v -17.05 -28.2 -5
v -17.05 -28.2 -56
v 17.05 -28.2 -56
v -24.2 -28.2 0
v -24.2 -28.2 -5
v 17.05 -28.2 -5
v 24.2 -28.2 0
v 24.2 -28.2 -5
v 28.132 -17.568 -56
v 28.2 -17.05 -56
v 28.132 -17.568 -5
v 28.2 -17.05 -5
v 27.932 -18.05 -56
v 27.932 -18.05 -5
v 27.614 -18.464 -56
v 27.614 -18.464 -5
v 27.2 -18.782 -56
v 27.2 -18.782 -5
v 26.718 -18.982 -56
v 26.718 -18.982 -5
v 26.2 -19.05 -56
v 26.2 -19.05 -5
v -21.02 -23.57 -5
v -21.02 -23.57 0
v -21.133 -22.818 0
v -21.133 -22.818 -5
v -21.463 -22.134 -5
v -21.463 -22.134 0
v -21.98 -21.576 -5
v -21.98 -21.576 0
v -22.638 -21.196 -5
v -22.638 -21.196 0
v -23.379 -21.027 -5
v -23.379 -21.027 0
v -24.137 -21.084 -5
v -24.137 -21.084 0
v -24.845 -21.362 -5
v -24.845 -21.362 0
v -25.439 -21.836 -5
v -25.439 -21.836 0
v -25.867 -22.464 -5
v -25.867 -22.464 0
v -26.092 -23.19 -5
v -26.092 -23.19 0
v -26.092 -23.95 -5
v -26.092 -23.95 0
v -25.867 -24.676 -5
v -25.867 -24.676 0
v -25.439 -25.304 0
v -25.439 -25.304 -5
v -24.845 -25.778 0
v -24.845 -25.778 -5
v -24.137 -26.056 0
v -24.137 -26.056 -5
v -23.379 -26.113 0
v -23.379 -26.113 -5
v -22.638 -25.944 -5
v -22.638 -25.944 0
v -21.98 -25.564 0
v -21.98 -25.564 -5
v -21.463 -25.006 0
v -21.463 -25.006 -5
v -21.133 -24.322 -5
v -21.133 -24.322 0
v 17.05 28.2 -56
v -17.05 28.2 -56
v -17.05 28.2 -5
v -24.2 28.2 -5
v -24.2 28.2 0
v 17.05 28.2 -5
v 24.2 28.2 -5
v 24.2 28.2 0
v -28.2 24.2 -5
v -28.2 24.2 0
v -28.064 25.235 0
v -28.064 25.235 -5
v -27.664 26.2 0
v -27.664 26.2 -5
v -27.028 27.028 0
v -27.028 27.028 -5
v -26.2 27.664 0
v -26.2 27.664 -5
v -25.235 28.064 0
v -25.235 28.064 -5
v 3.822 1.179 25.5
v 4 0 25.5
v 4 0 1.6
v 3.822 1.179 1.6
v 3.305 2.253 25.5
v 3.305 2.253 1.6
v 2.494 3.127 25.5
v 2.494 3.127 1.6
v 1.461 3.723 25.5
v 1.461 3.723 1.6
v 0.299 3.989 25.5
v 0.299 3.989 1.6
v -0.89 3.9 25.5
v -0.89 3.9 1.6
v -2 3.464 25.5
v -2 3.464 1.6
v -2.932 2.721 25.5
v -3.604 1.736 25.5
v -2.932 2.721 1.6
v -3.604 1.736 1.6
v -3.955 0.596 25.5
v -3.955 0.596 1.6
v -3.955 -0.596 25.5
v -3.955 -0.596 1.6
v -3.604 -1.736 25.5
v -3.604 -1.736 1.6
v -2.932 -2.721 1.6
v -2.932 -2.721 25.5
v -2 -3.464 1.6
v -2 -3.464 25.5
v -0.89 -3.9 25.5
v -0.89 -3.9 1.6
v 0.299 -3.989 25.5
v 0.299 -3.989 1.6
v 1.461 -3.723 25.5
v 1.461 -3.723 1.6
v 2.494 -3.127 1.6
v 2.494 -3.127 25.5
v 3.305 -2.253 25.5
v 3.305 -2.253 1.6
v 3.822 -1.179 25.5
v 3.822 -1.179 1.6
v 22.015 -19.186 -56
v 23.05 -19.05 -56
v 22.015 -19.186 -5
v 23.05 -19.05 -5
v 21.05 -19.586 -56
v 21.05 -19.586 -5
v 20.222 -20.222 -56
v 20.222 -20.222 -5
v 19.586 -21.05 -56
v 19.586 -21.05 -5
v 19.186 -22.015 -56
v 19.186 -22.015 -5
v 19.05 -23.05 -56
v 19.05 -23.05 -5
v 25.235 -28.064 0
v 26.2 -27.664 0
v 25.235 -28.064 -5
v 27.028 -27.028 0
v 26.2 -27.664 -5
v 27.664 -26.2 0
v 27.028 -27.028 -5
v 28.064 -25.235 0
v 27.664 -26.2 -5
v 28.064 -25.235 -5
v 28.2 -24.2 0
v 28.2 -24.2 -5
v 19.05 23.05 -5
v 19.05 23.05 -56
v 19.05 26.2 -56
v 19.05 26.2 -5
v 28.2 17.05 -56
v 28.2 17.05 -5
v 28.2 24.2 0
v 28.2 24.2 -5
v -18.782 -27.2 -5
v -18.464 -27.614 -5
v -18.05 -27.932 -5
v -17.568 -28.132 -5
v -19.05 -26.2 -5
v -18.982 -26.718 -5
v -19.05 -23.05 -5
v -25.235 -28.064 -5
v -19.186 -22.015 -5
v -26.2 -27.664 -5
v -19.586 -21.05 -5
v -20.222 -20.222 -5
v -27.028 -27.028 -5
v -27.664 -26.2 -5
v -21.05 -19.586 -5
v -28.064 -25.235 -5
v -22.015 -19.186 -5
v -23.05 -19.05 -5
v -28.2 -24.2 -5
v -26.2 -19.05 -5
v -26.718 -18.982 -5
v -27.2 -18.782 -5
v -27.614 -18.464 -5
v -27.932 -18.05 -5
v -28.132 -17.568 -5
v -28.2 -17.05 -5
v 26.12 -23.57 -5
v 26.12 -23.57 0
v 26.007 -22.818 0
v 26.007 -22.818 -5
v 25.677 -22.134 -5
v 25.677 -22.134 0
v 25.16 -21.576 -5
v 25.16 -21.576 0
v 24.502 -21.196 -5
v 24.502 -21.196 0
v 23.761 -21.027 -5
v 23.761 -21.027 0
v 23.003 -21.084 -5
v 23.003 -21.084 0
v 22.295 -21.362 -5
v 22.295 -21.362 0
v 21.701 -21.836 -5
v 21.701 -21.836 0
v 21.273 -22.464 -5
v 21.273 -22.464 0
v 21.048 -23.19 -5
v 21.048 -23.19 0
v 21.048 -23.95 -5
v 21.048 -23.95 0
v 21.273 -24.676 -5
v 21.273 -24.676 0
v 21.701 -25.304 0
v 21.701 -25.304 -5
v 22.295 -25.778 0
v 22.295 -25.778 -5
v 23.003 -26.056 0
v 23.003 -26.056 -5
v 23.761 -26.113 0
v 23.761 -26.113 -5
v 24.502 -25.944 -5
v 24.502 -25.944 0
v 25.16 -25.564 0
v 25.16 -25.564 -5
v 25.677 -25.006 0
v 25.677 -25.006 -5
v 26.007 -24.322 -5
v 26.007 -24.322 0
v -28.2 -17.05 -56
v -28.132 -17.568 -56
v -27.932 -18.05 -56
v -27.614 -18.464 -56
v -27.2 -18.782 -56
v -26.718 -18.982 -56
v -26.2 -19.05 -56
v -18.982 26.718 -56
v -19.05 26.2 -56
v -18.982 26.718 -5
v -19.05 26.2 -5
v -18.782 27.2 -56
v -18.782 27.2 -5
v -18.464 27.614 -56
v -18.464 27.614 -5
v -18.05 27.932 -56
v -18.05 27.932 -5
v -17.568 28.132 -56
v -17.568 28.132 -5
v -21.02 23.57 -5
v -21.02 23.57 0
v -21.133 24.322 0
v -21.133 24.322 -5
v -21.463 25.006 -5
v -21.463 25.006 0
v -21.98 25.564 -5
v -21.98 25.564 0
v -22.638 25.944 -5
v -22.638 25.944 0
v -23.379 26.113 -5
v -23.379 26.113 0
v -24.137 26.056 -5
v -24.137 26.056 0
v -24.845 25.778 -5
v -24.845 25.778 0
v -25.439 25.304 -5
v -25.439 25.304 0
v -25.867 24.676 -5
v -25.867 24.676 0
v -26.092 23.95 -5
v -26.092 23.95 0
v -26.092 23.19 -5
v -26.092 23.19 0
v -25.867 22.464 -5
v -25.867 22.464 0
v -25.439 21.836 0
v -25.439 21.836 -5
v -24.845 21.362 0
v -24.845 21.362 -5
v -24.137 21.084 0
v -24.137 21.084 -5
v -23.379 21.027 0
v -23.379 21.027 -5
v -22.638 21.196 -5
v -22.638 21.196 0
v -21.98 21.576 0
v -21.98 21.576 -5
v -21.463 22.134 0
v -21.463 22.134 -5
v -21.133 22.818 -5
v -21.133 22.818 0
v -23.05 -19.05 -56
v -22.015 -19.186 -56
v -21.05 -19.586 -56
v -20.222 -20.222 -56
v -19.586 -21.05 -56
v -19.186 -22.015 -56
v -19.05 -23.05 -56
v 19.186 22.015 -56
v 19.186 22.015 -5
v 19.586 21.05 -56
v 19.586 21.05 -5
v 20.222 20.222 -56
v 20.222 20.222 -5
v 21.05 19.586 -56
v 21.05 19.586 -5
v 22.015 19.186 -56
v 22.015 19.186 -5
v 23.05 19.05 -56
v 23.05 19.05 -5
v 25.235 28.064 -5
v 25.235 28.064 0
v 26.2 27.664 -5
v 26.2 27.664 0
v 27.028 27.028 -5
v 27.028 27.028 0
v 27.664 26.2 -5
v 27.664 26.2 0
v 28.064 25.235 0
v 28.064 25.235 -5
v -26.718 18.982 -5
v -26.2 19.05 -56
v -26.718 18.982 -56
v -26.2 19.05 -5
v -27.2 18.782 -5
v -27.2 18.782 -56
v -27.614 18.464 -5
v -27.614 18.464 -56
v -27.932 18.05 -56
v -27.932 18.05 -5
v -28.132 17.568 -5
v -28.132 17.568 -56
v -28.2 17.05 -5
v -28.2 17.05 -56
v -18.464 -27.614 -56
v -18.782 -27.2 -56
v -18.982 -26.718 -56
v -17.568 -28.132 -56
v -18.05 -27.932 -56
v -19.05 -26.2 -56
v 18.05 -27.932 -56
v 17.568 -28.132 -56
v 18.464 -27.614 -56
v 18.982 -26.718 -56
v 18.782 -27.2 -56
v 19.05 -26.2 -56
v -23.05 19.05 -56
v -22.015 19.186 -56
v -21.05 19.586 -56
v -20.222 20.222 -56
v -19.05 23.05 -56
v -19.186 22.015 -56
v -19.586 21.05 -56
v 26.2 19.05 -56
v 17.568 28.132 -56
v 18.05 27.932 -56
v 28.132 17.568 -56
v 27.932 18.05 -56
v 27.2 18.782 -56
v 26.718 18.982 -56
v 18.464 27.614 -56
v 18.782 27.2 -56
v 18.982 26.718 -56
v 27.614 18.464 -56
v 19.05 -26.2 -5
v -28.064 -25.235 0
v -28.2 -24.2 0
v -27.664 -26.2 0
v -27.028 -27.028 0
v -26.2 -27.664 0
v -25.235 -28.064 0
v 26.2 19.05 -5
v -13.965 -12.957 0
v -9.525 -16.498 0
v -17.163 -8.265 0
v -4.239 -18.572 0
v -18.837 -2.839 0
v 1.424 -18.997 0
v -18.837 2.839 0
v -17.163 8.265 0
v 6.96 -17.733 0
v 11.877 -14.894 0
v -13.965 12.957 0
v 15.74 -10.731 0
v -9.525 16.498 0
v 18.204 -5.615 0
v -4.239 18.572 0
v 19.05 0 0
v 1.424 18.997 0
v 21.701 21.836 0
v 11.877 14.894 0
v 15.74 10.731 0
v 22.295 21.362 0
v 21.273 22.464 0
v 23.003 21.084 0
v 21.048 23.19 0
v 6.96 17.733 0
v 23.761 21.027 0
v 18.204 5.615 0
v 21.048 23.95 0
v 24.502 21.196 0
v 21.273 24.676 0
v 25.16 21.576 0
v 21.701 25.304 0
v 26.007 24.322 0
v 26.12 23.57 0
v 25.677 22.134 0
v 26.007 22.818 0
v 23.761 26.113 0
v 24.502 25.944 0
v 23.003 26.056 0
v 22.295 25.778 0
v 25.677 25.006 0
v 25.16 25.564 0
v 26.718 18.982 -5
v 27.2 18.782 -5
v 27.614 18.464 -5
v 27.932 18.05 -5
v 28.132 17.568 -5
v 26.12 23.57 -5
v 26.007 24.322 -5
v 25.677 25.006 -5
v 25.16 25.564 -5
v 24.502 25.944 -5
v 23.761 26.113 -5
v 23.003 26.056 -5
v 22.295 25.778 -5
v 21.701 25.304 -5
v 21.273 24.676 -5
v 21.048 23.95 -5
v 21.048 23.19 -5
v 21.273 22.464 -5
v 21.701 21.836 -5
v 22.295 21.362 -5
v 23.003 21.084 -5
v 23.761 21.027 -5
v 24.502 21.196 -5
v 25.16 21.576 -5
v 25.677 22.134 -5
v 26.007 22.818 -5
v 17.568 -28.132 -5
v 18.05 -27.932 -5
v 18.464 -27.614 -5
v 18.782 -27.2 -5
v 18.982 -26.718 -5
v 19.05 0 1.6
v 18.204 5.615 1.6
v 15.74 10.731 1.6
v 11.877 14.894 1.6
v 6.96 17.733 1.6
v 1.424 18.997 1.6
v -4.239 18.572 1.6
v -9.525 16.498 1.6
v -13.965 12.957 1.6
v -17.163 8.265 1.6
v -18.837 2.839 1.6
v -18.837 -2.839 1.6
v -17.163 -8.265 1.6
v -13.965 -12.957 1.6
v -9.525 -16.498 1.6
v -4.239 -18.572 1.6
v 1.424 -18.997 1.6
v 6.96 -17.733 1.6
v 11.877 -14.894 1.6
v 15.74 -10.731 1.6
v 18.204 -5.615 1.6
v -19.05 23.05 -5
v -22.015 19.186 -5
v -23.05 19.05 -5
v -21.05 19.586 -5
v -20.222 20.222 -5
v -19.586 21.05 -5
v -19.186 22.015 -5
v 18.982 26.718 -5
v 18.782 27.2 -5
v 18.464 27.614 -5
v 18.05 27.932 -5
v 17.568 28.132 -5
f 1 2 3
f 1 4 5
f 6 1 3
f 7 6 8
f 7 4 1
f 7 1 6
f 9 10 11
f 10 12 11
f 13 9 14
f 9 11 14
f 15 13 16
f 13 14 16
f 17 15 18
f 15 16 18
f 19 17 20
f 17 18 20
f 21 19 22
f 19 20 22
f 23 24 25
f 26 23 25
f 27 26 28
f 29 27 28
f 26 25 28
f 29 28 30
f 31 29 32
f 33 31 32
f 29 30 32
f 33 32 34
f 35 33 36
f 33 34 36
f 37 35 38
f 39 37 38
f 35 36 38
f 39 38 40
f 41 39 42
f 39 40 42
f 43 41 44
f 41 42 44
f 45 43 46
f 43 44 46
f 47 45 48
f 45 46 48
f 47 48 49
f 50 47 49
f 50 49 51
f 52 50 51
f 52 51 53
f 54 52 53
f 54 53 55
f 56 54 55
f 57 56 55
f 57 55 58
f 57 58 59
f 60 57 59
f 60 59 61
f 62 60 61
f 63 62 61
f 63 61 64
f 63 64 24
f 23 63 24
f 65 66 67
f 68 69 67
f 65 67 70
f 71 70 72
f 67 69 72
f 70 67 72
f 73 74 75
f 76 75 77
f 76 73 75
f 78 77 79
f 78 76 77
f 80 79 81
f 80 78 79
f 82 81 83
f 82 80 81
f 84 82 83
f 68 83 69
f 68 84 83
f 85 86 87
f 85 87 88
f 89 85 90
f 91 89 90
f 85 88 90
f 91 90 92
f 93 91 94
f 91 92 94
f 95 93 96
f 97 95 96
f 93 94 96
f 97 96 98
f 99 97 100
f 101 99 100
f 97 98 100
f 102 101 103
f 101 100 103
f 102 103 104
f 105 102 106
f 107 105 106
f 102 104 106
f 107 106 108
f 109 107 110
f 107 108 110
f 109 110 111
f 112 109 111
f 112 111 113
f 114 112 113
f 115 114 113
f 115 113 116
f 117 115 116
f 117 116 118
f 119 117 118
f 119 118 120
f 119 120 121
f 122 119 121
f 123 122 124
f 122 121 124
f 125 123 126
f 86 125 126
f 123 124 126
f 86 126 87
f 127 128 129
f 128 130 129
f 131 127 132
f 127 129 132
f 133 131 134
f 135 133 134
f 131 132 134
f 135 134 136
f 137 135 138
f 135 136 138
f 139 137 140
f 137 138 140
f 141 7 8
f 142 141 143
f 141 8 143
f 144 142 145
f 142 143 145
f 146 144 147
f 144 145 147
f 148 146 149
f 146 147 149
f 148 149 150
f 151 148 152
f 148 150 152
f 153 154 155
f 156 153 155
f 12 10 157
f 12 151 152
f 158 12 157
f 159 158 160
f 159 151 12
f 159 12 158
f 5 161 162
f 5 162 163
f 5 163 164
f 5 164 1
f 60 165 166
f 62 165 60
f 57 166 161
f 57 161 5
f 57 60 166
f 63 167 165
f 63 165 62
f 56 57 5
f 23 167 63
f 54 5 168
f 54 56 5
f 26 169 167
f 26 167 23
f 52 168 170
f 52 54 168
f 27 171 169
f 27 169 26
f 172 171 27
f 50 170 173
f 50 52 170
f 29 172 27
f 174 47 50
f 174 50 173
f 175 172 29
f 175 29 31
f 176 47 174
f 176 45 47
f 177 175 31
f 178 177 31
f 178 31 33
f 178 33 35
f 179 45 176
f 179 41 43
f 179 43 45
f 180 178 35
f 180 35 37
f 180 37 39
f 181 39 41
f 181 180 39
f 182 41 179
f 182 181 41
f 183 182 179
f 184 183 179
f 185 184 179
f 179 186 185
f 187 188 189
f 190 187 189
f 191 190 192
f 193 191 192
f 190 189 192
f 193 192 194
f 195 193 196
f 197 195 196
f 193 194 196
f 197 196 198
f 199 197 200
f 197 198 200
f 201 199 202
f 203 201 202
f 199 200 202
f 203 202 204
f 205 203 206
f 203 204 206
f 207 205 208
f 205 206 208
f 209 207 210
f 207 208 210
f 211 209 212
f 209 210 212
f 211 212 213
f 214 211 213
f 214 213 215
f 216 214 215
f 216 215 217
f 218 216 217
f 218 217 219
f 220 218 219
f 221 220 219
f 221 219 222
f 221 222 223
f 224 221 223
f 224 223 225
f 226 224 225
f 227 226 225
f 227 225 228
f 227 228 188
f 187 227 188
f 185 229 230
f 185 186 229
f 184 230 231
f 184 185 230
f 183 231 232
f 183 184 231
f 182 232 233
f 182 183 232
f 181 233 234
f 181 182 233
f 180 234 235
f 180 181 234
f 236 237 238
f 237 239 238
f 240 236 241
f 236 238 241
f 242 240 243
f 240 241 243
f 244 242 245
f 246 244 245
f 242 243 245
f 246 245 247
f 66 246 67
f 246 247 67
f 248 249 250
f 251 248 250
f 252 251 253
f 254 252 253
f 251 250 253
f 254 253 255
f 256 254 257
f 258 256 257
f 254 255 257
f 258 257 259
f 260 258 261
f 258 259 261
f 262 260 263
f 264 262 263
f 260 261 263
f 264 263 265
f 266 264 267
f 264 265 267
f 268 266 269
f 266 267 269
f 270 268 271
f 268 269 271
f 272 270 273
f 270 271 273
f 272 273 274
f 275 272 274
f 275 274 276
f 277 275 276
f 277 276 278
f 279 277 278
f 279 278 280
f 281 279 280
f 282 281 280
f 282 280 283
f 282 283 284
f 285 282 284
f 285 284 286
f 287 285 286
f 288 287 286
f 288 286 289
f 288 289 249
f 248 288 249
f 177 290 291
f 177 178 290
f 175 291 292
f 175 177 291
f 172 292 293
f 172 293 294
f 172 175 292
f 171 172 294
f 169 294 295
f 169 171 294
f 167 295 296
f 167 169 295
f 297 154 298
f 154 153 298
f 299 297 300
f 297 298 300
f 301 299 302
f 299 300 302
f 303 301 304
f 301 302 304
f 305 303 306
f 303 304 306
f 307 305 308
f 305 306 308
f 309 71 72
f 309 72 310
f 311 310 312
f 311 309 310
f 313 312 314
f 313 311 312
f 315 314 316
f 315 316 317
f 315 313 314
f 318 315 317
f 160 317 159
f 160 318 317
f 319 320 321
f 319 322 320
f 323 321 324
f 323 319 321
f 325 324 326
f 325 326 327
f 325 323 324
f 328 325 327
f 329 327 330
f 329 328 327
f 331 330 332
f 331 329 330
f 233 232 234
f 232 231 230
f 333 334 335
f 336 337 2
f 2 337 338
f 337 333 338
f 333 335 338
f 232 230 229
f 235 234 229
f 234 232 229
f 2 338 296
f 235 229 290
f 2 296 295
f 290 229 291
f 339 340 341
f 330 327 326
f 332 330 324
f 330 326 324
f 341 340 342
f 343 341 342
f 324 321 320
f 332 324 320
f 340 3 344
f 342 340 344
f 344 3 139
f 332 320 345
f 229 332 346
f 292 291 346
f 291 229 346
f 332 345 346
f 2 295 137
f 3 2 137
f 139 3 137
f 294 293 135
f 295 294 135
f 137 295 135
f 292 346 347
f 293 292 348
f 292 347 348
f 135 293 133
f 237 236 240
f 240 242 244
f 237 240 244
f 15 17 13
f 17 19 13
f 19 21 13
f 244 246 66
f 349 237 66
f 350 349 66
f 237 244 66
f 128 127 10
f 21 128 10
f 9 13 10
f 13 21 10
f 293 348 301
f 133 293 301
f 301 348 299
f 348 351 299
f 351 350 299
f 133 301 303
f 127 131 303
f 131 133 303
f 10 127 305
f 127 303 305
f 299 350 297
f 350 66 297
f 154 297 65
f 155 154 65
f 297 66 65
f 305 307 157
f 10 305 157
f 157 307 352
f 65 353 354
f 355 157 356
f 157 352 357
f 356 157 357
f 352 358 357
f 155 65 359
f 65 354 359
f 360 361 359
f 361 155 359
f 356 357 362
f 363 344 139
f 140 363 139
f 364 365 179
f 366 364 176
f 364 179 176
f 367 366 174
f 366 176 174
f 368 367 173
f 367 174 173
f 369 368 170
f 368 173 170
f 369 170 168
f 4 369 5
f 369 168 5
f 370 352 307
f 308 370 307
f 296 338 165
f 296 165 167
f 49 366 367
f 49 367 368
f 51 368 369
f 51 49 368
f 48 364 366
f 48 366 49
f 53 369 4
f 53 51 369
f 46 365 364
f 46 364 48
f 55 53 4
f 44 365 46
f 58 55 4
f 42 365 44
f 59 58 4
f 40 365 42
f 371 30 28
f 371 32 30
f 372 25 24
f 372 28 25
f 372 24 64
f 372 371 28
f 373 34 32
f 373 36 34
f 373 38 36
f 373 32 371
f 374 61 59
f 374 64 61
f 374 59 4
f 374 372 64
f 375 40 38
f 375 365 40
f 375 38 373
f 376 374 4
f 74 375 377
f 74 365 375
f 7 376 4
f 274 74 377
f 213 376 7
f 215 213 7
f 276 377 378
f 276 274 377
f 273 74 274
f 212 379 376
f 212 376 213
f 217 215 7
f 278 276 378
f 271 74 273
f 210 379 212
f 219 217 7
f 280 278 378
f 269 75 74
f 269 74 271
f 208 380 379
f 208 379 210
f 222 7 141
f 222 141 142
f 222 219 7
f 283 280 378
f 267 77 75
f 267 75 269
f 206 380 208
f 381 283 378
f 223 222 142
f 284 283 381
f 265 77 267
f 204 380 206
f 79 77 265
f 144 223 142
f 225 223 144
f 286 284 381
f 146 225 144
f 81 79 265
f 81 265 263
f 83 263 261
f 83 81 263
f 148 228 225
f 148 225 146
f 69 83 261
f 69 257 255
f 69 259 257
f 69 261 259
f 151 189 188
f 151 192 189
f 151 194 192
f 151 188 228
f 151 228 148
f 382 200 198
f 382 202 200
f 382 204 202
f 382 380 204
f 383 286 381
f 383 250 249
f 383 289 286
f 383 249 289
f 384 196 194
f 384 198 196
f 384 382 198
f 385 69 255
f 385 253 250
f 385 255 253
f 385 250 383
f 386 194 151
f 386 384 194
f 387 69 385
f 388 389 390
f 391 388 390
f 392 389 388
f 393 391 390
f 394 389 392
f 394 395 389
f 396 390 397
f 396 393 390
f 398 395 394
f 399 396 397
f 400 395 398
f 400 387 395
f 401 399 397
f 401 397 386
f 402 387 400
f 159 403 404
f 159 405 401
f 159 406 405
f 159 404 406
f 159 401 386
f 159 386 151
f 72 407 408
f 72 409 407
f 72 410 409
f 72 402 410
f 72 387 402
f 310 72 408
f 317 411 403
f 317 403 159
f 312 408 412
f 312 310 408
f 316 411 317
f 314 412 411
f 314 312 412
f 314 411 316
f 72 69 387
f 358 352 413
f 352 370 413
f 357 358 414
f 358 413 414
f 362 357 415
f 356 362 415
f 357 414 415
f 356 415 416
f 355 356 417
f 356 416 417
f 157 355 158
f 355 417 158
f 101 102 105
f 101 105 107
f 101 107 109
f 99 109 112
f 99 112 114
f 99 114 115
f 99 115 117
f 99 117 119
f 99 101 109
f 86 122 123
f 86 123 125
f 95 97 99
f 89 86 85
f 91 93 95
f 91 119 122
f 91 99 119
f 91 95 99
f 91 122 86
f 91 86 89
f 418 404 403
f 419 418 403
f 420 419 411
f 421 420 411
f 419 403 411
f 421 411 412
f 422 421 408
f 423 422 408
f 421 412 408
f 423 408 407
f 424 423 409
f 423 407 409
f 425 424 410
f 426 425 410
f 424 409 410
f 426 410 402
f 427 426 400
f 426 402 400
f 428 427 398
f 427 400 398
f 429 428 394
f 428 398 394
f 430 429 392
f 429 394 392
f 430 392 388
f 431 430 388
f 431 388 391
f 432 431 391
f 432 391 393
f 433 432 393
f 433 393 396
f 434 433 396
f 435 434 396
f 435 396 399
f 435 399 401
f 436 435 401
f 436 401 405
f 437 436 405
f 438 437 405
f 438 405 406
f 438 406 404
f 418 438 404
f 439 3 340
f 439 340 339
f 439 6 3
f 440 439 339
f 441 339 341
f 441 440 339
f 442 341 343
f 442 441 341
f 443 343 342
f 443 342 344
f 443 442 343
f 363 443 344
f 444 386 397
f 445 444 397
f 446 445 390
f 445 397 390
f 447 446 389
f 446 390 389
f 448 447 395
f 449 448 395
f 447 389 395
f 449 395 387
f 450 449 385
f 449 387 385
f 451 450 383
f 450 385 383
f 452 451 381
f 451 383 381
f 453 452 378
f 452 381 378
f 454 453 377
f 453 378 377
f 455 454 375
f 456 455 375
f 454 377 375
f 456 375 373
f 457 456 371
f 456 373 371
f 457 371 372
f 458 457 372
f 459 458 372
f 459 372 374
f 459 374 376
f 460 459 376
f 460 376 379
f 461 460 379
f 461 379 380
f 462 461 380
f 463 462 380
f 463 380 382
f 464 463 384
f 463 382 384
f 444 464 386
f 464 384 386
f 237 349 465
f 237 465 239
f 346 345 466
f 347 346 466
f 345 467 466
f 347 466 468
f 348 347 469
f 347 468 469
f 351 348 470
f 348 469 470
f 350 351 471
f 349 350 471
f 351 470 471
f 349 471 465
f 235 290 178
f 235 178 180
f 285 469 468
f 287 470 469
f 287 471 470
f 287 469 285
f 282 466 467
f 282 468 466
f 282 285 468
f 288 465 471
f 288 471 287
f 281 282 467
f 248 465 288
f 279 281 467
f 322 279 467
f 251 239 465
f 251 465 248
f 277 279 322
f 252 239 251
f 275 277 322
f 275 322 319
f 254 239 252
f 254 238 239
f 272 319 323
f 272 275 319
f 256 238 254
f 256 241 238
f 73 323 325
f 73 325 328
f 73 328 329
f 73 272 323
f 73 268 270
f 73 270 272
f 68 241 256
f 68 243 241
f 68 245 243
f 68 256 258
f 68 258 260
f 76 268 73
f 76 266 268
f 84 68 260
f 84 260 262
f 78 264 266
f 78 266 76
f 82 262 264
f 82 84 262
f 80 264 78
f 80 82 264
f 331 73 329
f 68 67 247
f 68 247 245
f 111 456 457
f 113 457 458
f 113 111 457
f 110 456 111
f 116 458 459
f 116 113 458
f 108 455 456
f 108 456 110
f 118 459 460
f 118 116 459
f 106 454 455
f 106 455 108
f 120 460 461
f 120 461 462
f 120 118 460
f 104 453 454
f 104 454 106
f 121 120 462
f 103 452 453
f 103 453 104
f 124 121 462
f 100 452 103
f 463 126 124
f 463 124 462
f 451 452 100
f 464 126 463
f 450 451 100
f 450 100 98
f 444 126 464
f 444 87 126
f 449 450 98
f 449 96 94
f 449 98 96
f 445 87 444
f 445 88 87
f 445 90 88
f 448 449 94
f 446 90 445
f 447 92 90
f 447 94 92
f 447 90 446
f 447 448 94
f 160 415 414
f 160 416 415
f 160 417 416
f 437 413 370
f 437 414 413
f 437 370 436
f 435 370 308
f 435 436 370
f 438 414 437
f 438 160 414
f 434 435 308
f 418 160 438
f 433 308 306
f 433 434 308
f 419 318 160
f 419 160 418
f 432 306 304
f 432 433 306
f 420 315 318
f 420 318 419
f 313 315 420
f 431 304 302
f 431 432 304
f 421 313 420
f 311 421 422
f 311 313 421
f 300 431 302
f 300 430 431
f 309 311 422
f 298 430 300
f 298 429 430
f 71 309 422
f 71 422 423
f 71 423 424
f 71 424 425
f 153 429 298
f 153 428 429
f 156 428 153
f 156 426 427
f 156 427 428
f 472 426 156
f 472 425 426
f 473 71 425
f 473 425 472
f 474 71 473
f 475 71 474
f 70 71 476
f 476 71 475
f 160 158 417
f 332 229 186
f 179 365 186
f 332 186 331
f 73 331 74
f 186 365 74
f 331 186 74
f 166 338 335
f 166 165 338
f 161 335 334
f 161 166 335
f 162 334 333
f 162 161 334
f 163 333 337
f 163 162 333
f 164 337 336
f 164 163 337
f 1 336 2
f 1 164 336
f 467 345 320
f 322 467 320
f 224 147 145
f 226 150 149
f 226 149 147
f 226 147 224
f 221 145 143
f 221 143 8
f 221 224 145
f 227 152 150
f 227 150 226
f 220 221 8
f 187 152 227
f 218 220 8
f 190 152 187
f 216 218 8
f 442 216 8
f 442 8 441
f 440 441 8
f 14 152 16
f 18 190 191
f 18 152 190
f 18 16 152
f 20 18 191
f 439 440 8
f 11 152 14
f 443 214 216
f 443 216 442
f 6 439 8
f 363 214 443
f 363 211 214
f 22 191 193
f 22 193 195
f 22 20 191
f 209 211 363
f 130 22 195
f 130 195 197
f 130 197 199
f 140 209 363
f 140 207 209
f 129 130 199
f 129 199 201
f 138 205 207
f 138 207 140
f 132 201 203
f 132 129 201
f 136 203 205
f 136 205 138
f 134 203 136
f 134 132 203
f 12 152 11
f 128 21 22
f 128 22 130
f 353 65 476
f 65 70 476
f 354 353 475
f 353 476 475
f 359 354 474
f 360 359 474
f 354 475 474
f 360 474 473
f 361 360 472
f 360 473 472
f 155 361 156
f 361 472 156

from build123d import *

# Parameters (mm, degrees)
SKETCH1_W           = 56.4
SKETCH1_H           = 56.4
BOSS_EXTRUDE1_DEPTH = 56
SKETCH2_R           = 2.55
CUT_EXTRUDE1_DEPTH  = 6
SKETCH3_R           = 19.05
BOSS_EXTRUDE2_DEPTH = 1.6
SKETCH4_R           = 4
BOSS_EXTRUDE3_DEPTH = 23.9
FILLET1_R           = 4
SKETCH5_W           = 9.15
SKETCH5_H           = 9.15
CUT_EXTRUDE2_DEPTH  = 51
FILLET3_R           = 4
FILLET4_R           = 2


with BuildPart() as part:
    # Sketch1 → Boss-Extrude1 (new body)
    with BuildSketch(Plane.XY):
        Rectangle(SKETCH1_W, SKETCH1_H)
    extrude(amount=-BOSS_EXTRUDE1_DEPTH)

    # Sketch2 → Cut-Extrude1 (cut)
    with BuildSketch(Plane.XY):
        with Locations((-23.57, 23.57)):
            Circle(SKETCH2_R)
        with Locations((23.57, 23.57)):
            Circle(SKETCH2_R)
        with Locations((23.57, -23.57)):
            Circle(SKETCH2_R)
        with Locations((-23.57, -23.57)):
            Circle(SKETCH2_R)
    extrude(amount=-CUT_EXTRUDE1_DEPTH, mode=Mode.SUBTRACT)

    # Sketch3 → Boss-Extrude2 (add)
    with BuildSketch(Plane.XY):
        Circle(SKETCH3_R)
    extrude(amount=BOSS_EXTRUDE2_DEPTH)

    # Sketch4 → Boss-Extrude3 (add)
    with BuildSketch(Plane.XY.offset(1.6)):
        Circle(SKETCH4_R)
    extrude(amount=BOSS_EXTRUDE3_DEPTH)

    # Fillet1
    fillet1_edges = [part.edges().sort_by_distance(p)[0] for p in [
        (28.2, -28.2, -28),
        (-28.2, -28.2, -28),
        (-28.2, 28.2, -28),
        (28.2, 28.2, -28),
    ]]
    fillet(fillet1_edges, radius=FILLET1_R)

    # Sketch5 → Cut-Extrude2 (cut)
    with BuildSketch(Plane(origin=(0, 0, -56), x_dir=(-1, 0, 0), z_dir=(0, 0, -1))):
        with Locations((-23.625, 23.625)):
            Rectangle(SKETCH5_W, SKETCH5_H)
        with Locations((23.625, 23.625)):
            Rectangle(SKETCH5_W, SKETCH5_H)
        with Locations((23.625, -23.625)):
            Rectangle(SKETCH5_W, SKETCH5_H)
        with Locations((-23.625, -23.625)):
            Rectangle(SKETCH5_W, SKETCH5_H)
    extrude(amount=-CUT_EXTRUDE2_DEPTH, mode=Mode.SUBTRACT)

    # Fillet3
    fillet3_edges = [part.edges().sort_by_distance(p)[0] for p in [
        (-19.05, 19.05, -30.5),
        (19.05, 19.05, -30.5),
        (19.05, -19.05, -30.5),
        (-19.05, -19.05, -30.5),
    ]]
    fillet(fillet3_edges, radius=FILLET3_R)

    # Fillet4
    fillet4_edges = [part.edges().sort_by_distance(p)[0] for p in [
        (-28.2, 19.05, -30.5),
        (-19.05, 28.2, -30.5),
        (28.2, 19.05, -30.5),
        (19.05, 28.2, -30.5),
        (28.2, -19.05, -30.5),
        (19.05, -28.2, -30.5),
        (-28.2, -19.05, -30.5),
        (-19.05, -28.2, -30.5),
    ]]
    fillet(fillet4_edges, radius=FILLET4_R)


solid = part.part
